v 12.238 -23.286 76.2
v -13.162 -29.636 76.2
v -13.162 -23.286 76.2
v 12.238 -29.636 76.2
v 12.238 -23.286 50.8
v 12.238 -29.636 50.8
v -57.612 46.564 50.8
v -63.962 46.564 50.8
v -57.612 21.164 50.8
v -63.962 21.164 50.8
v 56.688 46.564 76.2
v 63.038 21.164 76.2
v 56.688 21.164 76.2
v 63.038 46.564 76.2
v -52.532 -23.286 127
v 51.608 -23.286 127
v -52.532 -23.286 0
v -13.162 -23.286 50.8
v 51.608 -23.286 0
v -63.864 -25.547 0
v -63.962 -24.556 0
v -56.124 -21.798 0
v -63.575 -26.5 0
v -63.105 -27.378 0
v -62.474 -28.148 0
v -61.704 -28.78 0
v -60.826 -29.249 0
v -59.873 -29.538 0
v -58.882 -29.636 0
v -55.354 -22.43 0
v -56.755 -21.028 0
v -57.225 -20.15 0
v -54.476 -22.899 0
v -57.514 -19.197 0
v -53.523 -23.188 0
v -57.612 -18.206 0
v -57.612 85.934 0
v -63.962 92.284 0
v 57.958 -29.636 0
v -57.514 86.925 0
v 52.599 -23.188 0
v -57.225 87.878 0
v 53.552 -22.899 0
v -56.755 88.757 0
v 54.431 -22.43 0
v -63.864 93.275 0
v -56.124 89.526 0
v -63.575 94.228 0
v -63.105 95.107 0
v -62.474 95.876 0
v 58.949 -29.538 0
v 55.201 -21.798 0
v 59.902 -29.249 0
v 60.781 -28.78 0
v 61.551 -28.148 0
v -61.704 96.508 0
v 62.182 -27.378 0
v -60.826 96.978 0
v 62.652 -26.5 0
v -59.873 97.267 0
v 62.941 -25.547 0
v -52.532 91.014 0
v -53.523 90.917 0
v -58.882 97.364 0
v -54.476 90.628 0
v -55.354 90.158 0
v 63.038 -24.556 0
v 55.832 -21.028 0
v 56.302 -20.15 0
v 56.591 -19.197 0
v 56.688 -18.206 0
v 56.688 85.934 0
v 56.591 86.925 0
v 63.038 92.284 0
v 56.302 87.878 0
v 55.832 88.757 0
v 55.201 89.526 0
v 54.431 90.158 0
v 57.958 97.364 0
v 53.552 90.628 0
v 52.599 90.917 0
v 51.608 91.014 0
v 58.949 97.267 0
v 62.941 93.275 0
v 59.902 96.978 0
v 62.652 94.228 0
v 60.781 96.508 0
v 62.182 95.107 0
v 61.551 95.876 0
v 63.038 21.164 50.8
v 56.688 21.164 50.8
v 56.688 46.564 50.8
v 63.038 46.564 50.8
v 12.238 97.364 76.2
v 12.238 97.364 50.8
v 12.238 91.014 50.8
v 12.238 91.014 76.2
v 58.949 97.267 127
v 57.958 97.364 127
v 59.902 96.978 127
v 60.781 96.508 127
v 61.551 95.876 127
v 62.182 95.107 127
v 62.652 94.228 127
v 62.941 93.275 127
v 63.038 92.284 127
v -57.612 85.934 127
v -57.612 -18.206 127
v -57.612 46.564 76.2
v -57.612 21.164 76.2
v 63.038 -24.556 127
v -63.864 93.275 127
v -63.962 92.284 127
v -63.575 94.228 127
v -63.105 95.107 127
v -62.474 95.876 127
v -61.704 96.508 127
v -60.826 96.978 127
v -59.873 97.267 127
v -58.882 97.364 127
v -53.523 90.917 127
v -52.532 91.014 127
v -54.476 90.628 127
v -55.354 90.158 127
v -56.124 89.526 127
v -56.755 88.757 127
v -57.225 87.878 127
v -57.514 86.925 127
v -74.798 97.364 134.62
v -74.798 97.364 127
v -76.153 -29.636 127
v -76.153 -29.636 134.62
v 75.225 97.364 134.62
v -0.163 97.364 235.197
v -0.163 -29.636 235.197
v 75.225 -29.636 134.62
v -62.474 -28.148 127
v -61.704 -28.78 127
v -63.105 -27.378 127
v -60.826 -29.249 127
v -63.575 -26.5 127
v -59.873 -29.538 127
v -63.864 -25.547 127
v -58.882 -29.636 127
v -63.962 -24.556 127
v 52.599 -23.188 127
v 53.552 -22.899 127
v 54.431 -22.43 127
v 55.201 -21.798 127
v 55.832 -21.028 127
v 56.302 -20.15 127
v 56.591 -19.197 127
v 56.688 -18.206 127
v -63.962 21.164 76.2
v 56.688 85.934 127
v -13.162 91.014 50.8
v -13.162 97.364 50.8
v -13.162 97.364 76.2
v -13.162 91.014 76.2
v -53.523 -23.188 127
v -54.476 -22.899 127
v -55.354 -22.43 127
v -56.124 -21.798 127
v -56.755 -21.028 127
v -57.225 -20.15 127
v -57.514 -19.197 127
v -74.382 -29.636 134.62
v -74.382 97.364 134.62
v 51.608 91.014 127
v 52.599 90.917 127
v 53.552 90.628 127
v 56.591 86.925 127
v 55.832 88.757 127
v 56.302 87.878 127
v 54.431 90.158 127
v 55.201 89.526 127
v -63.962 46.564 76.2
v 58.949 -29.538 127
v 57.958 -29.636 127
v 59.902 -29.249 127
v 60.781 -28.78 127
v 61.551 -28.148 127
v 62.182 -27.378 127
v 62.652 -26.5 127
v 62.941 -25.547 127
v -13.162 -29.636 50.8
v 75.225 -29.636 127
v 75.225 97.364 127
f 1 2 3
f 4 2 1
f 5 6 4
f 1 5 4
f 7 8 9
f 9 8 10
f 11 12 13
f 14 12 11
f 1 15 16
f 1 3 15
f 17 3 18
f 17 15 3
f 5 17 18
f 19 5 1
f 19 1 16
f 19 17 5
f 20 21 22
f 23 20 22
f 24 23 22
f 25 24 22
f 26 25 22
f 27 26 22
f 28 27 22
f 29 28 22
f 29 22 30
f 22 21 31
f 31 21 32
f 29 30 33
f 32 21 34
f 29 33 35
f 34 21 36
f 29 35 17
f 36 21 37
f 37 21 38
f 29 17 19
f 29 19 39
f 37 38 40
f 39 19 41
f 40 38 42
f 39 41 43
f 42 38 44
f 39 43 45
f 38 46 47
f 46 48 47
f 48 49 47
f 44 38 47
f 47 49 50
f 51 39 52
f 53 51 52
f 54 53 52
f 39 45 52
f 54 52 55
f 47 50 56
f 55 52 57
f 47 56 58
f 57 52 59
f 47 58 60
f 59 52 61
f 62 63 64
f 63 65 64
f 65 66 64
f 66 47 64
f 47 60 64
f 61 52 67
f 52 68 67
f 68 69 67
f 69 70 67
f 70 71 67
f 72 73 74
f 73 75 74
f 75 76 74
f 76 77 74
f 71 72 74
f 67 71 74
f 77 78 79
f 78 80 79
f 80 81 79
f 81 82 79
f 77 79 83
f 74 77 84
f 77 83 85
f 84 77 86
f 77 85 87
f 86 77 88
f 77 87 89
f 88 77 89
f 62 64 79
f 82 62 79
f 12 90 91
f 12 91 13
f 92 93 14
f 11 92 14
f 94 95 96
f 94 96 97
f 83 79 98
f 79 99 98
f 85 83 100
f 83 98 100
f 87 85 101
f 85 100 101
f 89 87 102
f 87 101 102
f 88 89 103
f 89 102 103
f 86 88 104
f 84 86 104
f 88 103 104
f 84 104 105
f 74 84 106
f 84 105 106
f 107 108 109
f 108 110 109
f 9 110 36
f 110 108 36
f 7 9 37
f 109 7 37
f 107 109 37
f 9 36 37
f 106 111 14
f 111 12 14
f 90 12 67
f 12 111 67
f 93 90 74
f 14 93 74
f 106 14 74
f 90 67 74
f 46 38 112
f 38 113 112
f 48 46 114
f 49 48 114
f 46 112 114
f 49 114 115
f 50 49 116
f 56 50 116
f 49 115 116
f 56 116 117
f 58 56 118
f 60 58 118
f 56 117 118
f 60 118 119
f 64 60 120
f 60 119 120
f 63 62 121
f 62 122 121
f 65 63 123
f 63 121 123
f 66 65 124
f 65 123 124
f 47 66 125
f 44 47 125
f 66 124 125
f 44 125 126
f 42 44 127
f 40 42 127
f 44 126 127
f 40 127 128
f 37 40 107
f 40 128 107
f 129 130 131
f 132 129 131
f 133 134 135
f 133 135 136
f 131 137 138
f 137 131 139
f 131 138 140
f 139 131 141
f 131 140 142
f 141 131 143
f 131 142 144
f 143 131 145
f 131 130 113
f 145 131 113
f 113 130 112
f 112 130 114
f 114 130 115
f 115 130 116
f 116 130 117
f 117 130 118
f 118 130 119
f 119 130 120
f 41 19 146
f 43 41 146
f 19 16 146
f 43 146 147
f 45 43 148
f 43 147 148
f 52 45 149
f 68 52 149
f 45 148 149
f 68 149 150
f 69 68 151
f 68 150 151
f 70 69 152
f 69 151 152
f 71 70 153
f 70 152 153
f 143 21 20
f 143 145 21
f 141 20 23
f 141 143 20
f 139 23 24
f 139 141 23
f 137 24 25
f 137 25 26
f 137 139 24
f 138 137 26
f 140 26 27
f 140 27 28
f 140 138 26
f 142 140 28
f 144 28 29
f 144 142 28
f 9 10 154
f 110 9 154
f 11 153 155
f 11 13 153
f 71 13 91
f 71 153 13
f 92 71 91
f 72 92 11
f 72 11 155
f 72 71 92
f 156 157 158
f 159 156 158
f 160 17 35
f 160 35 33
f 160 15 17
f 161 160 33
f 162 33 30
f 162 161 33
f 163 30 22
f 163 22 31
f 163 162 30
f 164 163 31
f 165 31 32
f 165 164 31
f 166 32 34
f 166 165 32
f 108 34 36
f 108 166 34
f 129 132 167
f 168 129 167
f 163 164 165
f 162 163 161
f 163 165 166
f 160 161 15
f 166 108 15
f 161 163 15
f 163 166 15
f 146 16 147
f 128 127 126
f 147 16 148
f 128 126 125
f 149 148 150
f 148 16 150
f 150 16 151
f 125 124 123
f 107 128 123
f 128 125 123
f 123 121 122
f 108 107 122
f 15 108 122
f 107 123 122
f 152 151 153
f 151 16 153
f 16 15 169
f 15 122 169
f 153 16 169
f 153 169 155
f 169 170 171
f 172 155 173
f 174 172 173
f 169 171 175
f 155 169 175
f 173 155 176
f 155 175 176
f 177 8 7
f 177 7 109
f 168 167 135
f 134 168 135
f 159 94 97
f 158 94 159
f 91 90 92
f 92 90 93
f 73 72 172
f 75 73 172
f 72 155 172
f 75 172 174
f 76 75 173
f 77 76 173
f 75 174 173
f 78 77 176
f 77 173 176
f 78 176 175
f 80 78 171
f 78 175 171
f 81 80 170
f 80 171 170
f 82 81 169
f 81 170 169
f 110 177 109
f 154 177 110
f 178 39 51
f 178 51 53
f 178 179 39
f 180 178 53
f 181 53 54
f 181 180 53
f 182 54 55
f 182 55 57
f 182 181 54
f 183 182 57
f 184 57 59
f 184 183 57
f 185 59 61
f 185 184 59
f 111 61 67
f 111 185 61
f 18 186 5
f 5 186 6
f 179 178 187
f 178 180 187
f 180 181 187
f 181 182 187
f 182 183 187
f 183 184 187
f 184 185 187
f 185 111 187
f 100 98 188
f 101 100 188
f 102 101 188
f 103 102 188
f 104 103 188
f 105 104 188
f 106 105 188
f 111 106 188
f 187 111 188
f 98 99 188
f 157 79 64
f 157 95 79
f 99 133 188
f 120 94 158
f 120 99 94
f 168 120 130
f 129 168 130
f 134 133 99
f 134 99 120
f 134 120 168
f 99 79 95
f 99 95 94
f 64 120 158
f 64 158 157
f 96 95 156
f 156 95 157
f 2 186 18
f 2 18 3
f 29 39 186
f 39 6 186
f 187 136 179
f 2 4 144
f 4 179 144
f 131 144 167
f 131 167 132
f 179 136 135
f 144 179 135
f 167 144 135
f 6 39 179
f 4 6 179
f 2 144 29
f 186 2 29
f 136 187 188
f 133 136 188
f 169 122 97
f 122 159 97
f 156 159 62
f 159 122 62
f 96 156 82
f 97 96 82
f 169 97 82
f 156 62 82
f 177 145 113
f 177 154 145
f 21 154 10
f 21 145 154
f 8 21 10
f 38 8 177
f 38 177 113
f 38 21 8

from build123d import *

# Parameters (mm, degrees)
F0_W      = 127
F0_H      = 127
F0_W_2    = 114.3
F0_H_2    = 114.3
F1_DEPTH  = 127
F2_W      = 25.4
F2_H      = 25.4
F3_DEPTH  = 6.35
F6_COUNT  = 4
F7_R      = 5.08
F9_DEPTH  = 7.62
F11_DEPTH = 127


with BuildPart() as f1:
    # F0 (on Top) → F1 (new body)
    with BuildSketch(Plane.XY):
        with Locations((-0.4615932703, 33.8642211668)):
            Rectangle(F0_W, F0_H)
        with Locations((-0.4615932703, 33.8642211668)):
            Rectangle(F0_W_2, F0_H_2, mode=Mode.SUBTRACT)
    extrude(amount=F1_DEPTH)

    # F2 (on face) → F3 (cut, through all)
    with BuildSketch(Plane.YZ.offset(63.0384067297)):
        with Locations((33.8642211668, 63.5)):
            Rectangle(F2_W, F2_H)
    f3 = extrude(amount=-F3_DEPTH, mode=Mode.SUBTRACT)

    # F6: F3 ×4 about axis
    f6_axis = Axis((-0.4615932703, 33.8642211668, 78.3742320016), (0, 0, -1))
    for i in range(1, F6_COUNT):
        add(f3.rotate(f6_axis, i * 360 / F6_COUNT), mode=Mode.SUBTRACT)

    # F7
    f7_edges = [f1.edges().sort_by_distance(p)[0] for p in [
        (-63.961593, -29.635779, 63.5),
        (63.038407, -29.635779, 63.5),
        (-63.961593, 97.364221, 63.5),
        (56.688407, 91.014221, 63.5),
        (63.038407, 97.364221, 63.5),
        (-57.611593, 91.014221, 63.5),
        (-57.611593, -23.285779, 63.5),
        (56.688407, -23.285779, 63.5),
    ]]
    fillet(f7_edges, radius=F7_R)

    # F8 (on face) → F9 (join)
    with BuildSketch(Plane.XY.offset(127)):
        with BuildLine():
            ThreePointArc((63.0384067297, -24.5557788332), (61.5505091781, -28.1478812816), (57.9584067297, -29.6357788332))
            Line((57.9584067297, -29.6357788332), (75.2250626683, -29.6357788332))
            Line((75.2250626683, -29.6357788332), (75.2250626683, 97.3642211668))
            Line((75.2250626683, 97.3642211668), (57.9584067297, 97.3642211668))
            ThreePointArc((57.9584067297, 97.3642211668), (61.5505091781, 95.8763236152), (63.0384067297, 92.2842211668))
            Line((63.0384067297, 92.2842211668), (63.0384067297, -24.5557788332))
        make_face()
        with BuildLine():
            ThreePointArc((-63.9615932703, -24.5557788332), (-62.4736957187, -28.1478812816), (-58.8815932703, -29.6357788332))
            Line((-58.8815932703, -29.6357788332), (57.9584067297, -29.6357788332))
            ThreePointArc((57.9584067297, -29.6357788332), (61.5505091781, -28.1478812816), (63.0384067297, -24.5557788332))
            Line((63.0384067297, -24.5557788332), (63.0384067297, 92.2842211668))
            ThreePointArc((63.0384067297, 92.2842211668), (61.5505091781, 95.8763236152), (57.9584067297, 97.3642211668))
            Line((57.9584067297, 97.3642211668), (-58.8815932703, 97.3642211668))
            ThreePointArc((-58.8815932703, 97.3642211668), (-62.4736957187, 95.8763236152), (-63.9615932703, 92.2842211668))
            Line((-63.9615932703, 92.2842211668), (-63.9615932703, -24.5557788332))
        make_face()
        with BuildLine():
            ThreePointArc((-52.5315932703, -23.2857788332), (-56.1236957187, -21.7978812816), (-57.6115932703, -18.2057788332))
            Line((-57.6115932703, -18.2057788332), (-57.6115932703, 85.9342211668))
            ThreePointArc((-57.6115932703, 85.9342211668), (-56.1236957187, 89.5263236152), (-52.5315932703, 91.0142211668))
            Line((-52.5315932703, 91.0142211668), (51.6084067297, 91.0142211668))
            ThreePointArc((51.6084067297, 91.0142211668), (55.2005091781, 89.5263236152), (56.6884067297, 85.9342211668))
            Line((56.6884067297, 85.9342211668), (56.6884067297, -18.2057788332))
            ThreePointArc((56.6884067297, -18.2057788332), (55.2005091781, -21.7978812816), (51.6084067297, -23.2857788332))
            Line((51.6084067297, -23.2857788332), (-52.5315932703, -23.2857788332))
        make_face(mode=Mode.SUBTRACT)
        with BuildLine():
            Line((-57.6115932703, 85.9342211668), (-57.6115932703, -18.2057788332))
            ThreePointArc((-57.6115932703, -18.2057788332), (-56.1236957187, -21.7978812816), (-52.5315932703, -23.2857788332))
            Line((-52.5315932703, -23.2857788332), (51.6084067297, -23.2857788332))
            ThreePointArc((51.6084067297, -23.2857788332), (55.2005091781, -21.7978812816), (56.6884067297, -18.2057788332))
            Line((56.6884067297, -18.2057788332), (56.6884067297, 85.9342211668))
            ThreePointArc((56.6884067297, 85.9342211668), (55.2005091781, 89.5263236152), (51.6084067297, 91.0142211668))
            Line((51.6084067297, 91.0142211668), (-52.5315932703, 91.0142211668))
            ThreePointArc((-52.5315932703, 91.0142211668), (-56.1236957187, 89.5263236152), (-57.6115932703, 85.9342211668))
        make_face()
        with BuildLine():
            Line((-74.7978676376, 97.3642211668), (-76.1525549474, -29.6357788332))
            Line((-76.1525549474, -29.6357788332), (-58.8815932703, -29.6357788332))
            ThreePointArc((-58.8815932703, -29.6357788332), (-62.4736957187, -28.1478812816), (-63.9615932703, -24.5557788332))
            Line((-63.9615932703, -24.5557788332), (-63.9615932703, 92.2842211668))
            ThreePointArc((-63.9615932703, 92.2842211668), (-62.4736957187, 95.8763236152), (-58.8815932703, 97.3642211668))
            Line((-58.8815932703, 97.3642211668), (-74.7978676376, 97.3642211668))
        make_face()
    extrude(amount=F9_DEPTH)

    # F10 (on face) → F11 (join, through all)
    with BuildSketch(Plane(origin=(0, 97.3642211668, 0), x_dir=(-1, 0, 0), z_dir=(0, 1, 0))):
        Polygon((0.1627568882, 235.1974227433), (-75.2250626683, 134.62), (74.3815182296, 134.62), align=None)
    extrude(amount=-F11_DEPTH)


solid = f1.part
